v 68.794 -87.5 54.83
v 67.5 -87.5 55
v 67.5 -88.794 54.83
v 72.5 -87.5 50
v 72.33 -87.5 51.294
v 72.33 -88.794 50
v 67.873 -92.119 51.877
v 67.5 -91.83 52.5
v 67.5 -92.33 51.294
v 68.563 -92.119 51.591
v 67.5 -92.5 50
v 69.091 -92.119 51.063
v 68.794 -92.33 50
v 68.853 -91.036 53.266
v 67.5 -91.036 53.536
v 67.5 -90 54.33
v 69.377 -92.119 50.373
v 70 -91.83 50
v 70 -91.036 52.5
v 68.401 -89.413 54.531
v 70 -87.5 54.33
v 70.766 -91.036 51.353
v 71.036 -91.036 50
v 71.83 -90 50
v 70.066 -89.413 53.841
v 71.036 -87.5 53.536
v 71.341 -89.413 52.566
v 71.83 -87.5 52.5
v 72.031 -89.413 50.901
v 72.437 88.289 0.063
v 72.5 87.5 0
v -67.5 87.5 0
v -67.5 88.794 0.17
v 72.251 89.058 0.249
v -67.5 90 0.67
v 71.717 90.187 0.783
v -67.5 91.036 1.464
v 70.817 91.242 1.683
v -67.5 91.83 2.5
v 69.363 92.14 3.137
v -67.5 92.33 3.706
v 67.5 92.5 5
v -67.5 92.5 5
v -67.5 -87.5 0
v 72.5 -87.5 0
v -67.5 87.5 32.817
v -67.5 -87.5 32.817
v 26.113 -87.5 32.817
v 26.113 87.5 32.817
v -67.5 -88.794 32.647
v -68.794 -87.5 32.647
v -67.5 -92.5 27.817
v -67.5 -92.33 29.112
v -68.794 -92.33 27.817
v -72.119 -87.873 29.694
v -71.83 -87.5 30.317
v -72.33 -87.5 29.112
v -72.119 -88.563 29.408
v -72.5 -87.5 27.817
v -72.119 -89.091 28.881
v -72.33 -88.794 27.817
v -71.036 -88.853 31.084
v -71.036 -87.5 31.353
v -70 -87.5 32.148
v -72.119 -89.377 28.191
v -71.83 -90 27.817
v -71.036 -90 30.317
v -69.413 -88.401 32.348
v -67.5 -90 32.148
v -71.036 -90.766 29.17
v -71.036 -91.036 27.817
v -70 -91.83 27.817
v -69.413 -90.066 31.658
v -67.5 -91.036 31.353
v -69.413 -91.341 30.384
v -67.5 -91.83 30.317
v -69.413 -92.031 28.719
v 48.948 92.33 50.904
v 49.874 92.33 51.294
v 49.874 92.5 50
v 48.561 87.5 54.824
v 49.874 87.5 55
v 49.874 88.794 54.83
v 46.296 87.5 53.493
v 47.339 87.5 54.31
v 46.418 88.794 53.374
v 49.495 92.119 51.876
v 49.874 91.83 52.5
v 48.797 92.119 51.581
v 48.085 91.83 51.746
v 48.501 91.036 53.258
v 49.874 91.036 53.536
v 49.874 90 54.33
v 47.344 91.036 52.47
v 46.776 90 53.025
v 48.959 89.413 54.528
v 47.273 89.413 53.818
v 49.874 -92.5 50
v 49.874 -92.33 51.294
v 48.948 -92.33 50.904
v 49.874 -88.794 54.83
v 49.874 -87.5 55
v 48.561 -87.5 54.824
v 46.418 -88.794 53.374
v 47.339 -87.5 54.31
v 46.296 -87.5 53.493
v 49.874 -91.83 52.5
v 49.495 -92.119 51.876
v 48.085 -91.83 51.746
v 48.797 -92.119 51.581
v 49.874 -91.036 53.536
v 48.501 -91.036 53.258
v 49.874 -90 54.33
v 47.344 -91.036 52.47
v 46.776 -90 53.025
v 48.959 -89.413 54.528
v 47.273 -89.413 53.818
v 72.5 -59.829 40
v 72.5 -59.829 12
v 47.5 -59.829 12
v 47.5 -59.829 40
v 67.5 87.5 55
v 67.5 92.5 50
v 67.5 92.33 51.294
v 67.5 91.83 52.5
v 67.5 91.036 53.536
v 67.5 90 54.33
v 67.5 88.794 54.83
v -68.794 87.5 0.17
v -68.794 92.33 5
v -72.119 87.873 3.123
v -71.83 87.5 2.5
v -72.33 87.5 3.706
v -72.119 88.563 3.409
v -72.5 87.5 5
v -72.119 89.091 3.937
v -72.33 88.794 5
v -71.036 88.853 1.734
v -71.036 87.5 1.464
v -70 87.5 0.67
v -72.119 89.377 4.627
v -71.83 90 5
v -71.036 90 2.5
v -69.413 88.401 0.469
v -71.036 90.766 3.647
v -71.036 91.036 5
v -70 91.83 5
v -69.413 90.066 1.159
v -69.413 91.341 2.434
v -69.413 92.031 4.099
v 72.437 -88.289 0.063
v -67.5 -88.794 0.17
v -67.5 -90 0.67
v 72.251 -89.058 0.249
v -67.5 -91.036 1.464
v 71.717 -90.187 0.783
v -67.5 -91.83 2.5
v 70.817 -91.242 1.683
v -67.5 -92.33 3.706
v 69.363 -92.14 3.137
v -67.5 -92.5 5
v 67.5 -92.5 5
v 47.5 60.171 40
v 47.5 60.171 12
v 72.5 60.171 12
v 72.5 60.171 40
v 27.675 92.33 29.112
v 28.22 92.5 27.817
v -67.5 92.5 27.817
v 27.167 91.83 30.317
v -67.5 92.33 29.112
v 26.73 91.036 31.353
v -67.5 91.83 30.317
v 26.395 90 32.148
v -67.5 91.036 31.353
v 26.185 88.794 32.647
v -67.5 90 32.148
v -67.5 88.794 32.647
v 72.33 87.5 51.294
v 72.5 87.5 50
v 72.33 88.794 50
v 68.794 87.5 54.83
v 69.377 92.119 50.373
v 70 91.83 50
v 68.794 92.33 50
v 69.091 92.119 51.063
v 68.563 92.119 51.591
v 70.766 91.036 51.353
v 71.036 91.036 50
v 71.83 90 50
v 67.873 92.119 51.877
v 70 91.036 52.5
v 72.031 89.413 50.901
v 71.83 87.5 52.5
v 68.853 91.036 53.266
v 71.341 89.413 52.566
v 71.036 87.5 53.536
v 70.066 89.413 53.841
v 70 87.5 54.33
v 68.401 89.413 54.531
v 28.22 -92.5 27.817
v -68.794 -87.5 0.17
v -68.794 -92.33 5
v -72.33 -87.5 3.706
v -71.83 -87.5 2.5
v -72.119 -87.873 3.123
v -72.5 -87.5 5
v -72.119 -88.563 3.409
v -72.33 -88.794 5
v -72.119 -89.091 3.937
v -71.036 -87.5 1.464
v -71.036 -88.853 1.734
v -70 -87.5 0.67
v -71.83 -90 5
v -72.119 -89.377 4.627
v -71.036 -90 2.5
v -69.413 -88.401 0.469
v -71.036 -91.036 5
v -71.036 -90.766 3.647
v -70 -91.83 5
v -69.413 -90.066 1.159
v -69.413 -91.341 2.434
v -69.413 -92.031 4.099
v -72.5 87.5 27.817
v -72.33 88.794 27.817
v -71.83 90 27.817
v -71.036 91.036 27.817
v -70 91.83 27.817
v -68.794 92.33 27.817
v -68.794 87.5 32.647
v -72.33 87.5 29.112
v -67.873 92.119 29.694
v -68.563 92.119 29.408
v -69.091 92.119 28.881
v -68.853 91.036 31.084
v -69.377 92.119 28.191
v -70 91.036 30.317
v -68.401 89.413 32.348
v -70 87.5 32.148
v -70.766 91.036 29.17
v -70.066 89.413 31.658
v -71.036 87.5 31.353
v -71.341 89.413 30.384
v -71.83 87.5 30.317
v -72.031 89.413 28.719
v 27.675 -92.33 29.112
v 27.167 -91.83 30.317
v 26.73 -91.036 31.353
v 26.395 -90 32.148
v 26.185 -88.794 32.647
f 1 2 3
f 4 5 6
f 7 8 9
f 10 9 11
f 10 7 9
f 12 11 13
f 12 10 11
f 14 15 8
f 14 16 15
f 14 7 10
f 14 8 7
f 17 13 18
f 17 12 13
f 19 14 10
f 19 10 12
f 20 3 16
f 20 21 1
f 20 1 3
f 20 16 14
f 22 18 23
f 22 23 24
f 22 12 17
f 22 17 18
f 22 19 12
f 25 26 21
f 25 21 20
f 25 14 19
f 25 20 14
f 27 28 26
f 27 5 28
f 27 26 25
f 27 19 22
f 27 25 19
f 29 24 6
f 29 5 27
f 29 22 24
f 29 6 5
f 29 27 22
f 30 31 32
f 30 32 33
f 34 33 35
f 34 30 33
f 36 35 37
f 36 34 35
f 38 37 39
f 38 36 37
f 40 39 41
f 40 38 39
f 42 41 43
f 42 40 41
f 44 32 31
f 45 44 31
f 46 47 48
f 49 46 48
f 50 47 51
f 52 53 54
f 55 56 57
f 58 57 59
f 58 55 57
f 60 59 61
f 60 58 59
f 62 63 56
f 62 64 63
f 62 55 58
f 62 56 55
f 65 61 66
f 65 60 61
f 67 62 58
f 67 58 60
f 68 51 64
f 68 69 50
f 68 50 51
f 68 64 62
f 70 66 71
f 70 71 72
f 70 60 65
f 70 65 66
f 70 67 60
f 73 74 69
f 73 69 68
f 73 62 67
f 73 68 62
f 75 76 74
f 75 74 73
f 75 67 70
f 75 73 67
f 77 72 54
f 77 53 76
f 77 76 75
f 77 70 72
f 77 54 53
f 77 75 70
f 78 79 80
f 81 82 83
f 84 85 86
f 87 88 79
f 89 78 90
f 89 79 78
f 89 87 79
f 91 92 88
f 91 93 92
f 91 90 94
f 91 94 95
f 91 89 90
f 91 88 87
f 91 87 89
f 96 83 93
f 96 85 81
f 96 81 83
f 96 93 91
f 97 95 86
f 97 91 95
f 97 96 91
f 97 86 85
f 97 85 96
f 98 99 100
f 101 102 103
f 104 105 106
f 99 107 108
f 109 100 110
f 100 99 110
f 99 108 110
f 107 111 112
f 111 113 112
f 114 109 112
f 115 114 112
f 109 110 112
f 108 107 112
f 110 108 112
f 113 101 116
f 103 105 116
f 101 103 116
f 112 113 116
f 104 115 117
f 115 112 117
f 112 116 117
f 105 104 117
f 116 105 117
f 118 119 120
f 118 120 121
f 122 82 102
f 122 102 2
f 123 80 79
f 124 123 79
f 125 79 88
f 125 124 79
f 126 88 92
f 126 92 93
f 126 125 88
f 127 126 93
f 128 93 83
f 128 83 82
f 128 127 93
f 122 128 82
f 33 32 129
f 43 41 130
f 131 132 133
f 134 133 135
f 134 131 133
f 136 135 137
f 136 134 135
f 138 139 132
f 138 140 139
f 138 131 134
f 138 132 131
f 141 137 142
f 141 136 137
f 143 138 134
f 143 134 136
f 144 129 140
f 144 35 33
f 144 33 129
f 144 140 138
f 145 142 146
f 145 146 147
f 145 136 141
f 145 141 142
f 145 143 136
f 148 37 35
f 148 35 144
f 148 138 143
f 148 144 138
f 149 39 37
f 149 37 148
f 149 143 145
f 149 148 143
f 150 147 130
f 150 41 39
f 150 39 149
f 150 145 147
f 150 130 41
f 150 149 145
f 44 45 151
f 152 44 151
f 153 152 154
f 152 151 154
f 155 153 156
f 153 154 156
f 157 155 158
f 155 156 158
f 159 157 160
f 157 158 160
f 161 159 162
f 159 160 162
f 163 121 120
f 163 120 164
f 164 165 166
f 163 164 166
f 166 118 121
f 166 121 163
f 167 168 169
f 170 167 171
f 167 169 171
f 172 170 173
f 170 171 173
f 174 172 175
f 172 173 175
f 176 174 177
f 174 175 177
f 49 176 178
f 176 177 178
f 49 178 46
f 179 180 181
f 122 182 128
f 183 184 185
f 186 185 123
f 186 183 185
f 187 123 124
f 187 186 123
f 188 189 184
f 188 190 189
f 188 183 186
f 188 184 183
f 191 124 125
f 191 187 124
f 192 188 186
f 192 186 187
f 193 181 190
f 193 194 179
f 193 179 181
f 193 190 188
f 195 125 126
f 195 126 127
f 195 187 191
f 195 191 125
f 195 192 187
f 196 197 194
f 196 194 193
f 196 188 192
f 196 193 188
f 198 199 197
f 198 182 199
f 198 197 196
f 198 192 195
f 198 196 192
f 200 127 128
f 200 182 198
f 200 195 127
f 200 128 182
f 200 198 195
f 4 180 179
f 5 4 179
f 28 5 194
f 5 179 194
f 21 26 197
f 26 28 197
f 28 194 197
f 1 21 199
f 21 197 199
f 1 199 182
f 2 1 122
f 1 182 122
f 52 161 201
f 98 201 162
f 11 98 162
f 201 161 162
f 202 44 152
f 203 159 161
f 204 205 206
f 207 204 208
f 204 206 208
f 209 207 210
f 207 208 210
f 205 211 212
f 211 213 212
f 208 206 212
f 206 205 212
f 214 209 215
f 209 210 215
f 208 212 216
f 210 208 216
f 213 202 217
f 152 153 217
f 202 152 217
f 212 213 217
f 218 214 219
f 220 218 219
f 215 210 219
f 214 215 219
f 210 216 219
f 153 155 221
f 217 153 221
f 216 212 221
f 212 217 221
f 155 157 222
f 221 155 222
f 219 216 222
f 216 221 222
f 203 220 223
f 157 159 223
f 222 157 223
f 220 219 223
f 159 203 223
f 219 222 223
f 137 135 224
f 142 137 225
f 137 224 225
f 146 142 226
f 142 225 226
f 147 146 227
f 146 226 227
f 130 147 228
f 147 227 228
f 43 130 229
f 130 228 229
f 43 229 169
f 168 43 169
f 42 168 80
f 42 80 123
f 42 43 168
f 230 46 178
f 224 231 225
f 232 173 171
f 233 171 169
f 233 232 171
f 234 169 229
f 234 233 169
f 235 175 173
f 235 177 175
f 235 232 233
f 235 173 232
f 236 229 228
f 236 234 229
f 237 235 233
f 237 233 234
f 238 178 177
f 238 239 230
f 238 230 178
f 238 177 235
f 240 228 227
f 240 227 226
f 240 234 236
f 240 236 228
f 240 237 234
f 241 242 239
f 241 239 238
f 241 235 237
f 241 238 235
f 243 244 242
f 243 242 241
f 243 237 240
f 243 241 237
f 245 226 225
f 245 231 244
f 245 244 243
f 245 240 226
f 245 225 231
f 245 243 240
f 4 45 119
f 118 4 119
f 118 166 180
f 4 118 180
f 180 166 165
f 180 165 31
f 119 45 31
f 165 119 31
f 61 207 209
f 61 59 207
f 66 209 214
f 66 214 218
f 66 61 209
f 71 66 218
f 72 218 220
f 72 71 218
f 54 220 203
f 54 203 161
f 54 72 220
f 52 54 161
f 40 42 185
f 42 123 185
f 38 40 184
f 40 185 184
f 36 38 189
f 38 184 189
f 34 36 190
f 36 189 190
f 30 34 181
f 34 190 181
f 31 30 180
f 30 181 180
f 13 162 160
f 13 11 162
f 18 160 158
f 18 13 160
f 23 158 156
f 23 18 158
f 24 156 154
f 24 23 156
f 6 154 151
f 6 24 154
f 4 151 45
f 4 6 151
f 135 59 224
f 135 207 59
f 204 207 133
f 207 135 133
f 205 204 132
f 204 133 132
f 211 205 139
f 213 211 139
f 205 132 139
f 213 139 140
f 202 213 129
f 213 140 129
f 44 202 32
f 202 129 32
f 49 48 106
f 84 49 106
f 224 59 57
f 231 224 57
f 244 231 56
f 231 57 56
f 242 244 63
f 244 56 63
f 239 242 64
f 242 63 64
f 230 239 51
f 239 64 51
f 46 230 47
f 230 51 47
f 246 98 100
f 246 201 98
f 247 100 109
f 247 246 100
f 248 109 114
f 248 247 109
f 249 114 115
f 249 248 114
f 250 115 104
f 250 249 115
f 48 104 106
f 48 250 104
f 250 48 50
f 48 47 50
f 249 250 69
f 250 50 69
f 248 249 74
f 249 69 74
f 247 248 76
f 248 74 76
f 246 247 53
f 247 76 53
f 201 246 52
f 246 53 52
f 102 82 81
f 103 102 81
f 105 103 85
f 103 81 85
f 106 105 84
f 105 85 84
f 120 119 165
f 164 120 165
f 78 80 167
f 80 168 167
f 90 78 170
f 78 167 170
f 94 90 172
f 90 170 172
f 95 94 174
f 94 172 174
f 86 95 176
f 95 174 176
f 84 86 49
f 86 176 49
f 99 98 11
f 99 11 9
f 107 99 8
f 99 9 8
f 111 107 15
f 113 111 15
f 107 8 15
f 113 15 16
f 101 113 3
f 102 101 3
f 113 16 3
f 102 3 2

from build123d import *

# Parameters (mm, degrees)
F0_W     = 145
F0_H     = 185
F1_DEPTH = 55
F3_DEPTH = 98
F5_W     = 120
F5_H     = 28
F6_DEPTH = 25
F7_R     = 5


with BuildPart() as f1:
    # F0 (on Top) → F1 (new body)
    with BuildSketch(Plane.XY):
        Rectangle(F0_W, F0_H)
    extrude(amount=F1_DEPTH)

    # F2 (on Front) → F3 (cut, symmetric)
    with BuildSketch(Plane.XZ):
        Polygon((-92.57464, 55.003494), (-92.79651, 32.817475), (26.113287, 32.817475), (47.771066, 55.003494), align=None)
    extrude(amount=F3_DEPTH, both=True, mode=Mode.SUBTRACT)

    # F5 (on face) → F6 (cut)
    with BuildSketch(Plane.YZ.offset(72.5)):
        with Locations((0.170817, 26)):
            Rectangle(F5_W, F5_H)
    extrude(amount=-F6_DEPTH, mode=Mode.SUBTRACT)

    # F7
    f7_edges = [f1.edges().sort_by_distance(p)[0] for p in [
        (-23.193357, -92.5, 32.817475),
        (36.940471, -92.5, 43.908738),
        (-72.5, 0, 32.817475),
        (-23.193357, 92.5, 32.817475),
        (36.940471, 92.5, 43.908738),
        (47.767656, 0, 55),
        (72.5, 0, 55),
        (60.133828, -92.5, 55),
        (72.5, -92.5, 27.5),
        (72.5, 92.5, 27.5),
        (60.133828, 92.5, 55),
        (0, -92.5, 0),
        (0, 92.5, 0),
        (-72.5, 0, 0),
        (-72.5, -92.5, 16.408738),
        (-72.5, 92.5, 16.408738),
    ]]
    fillet(f7_edges, radius=F7_R)


solid = f1.part
